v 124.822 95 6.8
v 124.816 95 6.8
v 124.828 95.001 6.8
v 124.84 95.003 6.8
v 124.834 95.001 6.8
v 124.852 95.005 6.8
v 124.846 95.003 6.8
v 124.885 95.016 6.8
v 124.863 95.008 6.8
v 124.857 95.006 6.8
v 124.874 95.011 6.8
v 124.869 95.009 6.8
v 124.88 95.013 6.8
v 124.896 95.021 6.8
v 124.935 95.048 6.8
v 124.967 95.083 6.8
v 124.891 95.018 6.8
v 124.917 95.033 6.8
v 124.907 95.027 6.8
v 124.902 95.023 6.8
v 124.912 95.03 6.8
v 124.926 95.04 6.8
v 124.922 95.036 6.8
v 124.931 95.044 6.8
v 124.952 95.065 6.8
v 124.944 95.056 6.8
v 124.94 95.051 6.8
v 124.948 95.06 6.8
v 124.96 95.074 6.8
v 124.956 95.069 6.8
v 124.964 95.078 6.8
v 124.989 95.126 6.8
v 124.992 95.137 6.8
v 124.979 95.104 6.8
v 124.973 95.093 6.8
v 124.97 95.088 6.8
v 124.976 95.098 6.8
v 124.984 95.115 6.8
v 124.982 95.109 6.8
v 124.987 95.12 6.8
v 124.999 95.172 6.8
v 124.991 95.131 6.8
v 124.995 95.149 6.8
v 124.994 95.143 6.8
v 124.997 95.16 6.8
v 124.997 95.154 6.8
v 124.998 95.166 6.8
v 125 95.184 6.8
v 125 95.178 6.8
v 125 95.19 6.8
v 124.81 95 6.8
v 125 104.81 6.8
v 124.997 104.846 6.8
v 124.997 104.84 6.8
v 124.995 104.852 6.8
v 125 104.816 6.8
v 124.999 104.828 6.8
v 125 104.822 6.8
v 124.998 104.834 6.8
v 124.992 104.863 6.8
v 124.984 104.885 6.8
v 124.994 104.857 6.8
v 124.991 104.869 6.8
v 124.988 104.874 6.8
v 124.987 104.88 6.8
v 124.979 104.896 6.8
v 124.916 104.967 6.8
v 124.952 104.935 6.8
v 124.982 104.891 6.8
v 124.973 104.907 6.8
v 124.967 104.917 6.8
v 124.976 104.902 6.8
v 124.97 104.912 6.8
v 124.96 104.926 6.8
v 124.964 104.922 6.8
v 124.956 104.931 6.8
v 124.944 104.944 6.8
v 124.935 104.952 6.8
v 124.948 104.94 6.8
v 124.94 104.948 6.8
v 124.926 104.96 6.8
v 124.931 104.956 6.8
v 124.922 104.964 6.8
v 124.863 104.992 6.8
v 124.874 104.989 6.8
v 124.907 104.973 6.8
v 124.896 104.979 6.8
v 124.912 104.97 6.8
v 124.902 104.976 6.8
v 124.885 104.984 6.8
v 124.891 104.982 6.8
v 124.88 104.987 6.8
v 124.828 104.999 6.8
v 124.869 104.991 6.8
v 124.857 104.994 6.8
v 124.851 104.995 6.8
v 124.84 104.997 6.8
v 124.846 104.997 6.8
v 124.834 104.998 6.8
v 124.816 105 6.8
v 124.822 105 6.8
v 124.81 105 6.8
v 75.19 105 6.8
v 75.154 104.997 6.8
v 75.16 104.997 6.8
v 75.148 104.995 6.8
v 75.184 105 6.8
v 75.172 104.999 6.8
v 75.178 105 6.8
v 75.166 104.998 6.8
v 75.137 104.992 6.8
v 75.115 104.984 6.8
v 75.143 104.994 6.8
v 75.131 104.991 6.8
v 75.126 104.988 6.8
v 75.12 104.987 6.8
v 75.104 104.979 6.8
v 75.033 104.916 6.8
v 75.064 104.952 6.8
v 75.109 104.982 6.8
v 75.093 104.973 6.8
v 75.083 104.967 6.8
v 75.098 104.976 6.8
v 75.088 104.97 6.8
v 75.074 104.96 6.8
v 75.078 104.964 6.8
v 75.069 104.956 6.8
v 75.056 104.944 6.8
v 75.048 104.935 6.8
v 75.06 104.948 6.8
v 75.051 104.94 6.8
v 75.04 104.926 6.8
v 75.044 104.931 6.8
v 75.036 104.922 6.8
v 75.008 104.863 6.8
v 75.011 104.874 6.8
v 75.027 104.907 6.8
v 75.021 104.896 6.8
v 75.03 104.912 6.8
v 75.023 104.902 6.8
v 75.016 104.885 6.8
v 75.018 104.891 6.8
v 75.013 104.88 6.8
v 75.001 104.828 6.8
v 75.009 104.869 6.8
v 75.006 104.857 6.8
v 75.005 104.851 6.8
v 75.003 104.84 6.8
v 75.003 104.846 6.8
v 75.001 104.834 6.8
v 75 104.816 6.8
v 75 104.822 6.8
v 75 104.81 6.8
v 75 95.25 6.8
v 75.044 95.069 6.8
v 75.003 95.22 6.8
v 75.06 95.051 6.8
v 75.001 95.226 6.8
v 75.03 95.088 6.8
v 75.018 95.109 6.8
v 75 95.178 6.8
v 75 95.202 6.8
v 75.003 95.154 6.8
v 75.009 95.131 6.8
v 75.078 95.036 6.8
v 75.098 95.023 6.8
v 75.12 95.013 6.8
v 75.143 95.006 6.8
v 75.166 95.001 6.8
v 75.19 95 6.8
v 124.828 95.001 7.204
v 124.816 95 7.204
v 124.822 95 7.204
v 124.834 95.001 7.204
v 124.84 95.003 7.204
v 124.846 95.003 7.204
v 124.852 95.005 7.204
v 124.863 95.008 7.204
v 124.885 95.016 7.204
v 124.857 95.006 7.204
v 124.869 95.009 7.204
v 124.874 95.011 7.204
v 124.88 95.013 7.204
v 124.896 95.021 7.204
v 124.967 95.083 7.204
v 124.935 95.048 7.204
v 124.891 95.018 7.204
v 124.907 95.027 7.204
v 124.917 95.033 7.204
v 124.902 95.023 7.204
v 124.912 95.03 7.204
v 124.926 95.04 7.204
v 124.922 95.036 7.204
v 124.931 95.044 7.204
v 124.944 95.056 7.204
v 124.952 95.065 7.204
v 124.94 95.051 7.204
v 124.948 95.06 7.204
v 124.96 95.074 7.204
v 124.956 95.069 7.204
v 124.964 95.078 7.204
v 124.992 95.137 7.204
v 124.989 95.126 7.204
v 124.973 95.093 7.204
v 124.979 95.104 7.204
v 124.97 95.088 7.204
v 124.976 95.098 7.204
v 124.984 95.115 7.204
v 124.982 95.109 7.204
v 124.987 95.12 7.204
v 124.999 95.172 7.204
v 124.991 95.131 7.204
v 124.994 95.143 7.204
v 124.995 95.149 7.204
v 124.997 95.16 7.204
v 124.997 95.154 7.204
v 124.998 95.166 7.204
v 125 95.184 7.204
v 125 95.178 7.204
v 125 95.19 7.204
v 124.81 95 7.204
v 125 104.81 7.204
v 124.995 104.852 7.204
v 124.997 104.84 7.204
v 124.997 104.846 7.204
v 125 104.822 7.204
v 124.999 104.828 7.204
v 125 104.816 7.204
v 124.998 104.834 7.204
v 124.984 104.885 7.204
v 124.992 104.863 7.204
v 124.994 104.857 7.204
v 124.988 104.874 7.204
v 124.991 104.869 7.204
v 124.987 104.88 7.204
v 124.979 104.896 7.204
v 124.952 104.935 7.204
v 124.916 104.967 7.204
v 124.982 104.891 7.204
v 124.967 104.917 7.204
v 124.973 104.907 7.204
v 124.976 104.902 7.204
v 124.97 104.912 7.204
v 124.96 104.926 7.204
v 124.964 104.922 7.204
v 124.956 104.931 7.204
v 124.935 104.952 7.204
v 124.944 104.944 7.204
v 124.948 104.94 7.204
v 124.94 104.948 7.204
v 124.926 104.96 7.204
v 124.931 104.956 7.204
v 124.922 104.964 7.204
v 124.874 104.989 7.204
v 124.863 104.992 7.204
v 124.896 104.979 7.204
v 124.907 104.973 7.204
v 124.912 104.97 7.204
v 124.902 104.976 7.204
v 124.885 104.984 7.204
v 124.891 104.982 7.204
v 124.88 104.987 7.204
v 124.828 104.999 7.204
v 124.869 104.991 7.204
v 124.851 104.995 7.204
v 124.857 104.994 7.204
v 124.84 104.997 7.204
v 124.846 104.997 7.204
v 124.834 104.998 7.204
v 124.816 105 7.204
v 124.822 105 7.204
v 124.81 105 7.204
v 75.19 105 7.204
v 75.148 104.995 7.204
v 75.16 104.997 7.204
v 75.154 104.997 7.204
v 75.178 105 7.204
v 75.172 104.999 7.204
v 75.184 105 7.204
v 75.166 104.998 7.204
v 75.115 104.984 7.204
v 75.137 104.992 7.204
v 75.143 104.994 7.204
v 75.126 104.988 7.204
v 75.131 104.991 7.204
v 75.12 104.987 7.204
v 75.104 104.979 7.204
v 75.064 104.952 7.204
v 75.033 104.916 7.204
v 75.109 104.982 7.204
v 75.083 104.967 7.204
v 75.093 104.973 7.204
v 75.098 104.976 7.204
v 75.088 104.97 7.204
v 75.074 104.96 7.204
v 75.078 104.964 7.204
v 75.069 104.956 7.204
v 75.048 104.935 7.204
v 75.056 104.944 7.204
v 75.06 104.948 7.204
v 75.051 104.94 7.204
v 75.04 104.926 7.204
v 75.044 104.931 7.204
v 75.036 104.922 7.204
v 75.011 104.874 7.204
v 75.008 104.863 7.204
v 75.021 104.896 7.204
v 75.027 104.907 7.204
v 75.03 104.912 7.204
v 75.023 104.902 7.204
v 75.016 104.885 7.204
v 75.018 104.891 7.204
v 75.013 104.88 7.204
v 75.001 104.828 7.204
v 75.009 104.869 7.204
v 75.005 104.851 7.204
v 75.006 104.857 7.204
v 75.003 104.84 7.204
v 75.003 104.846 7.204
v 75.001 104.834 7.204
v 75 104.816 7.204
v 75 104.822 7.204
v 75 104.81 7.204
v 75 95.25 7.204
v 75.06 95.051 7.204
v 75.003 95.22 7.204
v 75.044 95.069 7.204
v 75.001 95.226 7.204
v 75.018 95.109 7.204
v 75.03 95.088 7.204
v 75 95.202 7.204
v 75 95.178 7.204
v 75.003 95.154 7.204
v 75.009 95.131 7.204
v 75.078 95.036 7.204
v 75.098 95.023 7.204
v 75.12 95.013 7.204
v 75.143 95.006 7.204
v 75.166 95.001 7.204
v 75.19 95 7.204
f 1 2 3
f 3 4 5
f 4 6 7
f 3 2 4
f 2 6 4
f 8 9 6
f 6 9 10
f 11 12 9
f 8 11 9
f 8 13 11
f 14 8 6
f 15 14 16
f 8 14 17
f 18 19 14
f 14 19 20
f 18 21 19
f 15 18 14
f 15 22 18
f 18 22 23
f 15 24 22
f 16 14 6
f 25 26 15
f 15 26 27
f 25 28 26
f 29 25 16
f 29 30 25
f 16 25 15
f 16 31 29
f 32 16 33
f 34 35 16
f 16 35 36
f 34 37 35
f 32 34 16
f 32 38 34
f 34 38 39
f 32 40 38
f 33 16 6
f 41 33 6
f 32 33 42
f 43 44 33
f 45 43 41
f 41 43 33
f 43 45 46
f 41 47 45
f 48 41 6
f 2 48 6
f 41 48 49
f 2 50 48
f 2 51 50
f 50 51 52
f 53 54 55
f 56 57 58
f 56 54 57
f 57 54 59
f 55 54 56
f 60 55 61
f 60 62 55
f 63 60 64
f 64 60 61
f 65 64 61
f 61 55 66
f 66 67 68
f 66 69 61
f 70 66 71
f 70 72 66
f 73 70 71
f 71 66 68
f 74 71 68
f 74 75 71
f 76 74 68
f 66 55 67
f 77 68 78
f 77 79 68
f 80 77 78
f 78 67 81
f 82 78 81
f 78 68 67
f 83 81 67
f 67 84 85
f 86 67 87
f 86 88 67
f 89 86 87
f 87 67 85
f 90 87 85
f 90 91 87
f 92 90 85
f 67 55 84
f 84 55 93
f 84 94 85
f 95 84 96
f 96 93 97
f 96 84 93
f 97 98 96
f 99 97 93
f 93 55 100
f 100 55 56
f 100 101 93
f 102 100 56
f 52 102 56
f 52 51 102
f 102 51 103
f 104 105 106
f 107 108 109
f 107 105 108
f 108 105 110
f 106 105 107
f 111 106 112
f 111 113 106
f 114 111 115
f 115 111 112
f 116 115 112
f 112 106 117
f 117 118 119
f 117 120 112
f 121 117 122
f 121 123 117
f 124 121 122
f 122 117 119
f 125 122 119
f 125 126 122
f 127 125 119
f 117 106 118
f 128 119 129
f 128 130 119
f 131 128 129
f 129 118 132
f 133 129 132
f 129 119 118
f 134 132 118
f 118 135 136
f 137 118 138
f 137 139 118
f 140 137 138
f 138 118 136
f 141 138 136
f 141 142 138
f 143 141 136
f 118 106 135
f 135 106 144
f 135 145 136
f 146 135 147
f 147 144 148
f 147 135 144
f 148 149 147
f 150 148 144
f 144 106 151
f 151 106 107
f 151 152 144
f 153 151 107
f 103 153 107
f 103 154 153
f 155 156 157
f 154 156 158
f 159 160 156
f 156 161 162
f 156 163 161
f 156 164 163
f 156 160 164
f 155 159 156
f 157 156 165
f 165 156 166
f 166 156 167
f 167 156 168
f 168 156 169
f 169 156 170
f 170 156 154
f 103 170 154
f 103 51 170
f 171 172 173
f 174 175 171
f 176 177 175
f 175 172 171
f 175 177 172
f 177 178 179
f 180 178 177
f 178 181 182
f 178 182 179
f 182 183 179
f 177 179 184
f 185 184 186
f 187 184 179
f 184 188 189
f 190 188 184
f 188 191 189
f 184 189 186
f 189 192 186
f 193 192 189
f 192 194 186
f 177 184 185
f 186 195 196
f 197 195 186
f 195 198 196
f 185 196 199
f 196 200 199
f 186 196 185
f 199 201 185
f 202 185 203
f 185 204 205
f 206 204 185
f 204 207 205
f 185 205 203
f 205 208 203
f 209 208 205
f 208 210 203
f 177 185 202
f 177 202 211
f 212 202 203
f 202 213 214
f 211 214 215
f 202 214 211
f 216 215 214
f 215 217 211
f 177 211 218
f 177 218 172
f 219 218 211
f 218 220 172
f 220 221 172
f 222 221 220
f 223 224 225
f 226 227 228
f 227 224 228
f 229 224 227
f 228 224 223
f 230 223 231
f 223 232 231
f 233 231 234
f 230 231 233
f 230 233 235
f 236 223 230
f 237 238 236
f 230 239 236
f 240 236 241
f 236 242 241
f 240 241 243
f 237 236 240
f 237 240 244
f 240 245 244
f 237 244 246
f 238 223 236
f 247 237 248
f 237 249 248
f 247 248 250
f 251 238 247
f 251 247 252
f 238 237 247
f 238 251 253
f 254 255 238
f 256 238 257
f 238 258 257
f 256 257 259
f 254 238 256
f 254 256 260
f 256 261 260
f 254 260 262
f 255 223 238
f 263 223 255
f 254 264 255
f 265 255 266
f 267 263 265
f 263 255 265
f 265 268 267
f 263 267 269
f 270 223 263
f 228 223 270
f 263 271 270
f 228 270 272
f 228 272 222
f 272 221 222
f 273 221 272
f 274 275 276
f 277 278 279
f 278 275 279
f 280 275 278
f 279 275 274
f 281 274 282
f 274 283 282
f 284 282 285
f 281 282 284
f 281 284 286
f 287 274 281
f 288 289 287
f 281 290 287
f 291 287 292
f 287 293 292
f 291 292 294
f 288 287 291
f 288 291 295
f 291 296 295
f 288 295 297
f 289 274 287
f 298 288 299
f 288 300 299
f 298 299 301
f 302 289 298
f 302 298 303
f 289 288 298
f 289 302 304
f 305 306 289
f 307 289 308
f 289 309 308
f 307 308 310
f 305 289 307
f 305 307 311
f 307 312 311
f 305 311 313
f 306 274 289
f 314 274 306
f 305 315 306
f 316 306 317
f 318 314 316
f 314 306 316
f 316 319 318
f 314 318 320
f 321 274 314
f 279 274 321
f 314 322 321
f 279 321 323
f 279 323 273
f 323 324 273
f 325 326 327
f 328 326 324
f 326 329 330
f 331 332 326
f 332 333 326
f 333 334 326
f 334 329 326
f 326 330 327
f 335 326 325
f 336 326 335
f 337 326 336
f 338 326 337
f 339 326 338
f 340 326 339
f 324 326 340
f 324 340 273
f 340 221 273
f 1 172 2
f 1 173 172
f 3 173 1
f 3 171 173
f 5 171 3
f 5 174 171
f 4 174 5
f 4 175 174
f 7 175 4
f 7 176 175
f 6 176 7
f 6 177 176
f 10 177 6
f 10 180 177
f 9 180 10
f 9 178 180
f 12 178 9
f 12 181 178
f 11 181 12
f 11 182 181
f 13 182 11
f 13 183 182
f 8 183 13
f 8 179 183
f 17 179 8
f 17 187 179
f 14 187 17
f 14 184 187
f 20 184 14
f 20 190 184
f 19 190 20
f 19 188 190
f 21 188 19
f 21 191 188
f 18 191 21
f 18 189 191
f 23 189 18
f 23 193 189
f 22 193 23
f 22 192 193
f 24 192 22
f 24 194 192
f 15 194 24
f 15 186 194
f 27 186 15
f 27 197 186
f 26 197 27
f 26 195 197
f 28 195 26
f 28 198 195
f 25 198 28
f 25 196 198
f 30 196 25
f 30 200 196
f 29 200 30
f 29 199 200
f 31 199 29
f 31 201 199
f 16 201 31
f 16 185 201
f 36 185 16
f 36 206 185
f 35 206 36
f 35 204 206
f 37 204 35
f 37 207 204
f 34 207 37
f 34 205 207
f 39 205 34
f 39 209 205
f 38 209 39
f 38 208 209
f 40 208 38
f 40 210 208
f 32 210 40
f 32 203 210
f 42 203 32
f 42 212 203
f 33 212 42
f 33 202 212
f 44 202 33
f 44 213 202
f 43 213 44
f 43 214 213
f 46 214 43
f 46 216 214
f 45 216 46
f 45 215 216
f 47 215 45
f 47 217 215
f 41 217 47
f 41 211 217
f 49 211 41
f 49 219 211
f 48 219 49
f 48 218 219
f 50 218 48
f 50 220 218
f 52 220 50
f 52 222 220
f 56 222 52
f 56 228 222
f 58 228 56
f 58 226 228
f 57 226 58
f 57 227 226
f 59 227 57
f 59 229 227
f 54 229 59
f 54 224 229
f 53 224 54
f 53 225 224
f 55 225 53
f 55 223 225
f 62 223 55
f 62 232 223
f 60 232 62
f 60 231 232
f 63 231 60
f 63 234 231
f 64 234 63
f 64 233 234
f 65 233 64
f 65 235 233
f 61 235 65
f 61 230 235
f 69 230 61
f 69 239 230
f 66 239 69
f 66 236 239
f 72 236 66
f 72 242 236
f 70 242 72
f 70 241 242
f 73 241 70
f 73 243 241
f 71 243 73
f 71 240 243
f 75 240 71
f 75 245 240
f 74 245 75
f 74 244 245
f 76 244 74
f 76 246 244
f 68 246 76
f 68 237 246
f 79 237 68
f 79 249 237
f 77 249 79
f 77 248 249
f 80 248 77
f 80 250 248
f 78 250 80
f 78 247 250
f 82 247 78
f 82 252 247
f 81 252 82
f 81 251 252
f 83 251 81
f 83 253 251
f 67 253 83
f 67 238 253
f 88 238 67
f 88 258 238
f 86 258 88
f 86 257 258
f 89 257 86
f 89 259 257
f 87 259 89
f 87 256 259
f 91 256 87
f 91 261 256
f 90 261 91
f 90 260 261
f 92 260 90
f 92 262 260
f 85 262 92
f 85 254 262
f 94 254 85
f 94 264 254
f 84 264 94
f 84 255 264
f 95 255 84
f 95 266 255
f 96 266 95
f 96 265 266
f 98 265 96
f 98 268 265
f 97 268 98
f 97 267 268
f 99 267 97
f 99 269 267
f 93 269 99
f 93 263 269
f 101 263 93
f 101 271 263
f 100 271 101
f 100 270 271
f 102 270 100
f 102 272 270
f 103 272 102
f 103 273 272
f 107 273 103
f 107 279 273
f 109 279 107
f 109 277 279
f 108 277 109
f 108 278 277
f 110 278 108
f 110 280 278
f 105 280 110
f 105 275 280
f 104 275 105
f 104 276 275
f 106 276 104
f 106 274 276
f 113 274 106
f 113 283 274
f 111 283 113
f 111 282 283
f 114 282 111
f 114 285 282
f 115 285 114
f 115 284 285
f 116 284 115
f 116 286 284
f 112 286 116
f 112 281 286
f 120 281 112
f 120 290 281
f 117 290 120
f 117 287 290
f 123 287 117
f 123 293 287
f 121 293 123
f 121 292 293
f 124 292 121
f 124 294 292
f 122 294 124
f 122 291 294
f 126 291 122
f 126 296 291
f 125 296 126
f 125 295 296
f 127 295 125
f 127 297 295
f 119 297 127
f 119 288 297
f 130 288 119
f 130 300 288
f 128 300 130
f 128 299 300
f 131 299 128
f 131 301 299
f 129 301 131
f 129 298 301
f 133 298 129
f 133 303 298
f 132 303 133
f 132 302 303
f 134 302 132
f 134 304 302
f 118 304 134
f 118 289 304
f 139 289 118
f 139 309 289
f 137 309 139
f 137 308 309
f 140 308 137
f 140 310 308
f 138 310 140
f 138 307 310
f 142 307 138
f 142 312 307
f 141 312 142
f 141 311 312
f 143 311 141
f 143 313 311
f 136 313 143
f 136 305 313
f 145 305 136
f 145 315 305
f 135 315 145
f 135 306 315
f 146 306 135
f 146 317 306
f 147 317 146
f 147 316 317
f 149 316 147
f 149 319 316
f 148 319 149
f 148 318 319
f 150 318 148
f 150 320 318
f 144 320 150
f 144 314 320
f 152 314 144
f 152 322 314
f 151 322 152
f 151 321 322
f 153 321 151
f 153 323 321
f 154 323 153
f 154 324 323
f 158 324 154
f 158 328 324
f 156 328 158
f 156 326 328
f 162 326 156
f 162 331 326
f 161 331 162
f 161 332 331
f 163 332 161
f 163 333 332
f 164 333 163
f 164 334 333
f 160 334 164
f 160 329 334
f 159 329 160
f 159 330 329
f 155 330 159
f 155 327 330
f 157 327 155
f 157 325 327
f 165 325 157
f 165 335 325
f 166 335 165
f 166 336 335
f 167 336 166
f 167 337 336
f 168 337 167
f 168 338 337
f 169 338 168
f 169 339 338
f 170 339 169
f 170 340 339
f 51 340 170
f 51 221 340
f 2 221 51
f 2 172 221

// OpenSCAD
module drawBasicShape(x1, y1, x2, y2, width)
{
	length = sqrt((x1-x2)*(x1-x2) + (y1-y2)*(y1-y2));
	if (width!=0.0) {
		square(size = [width, length], center = false);
		translate([width/2.0, 0, 0]) circle(d=width);
		translate([width/2.0, length, 0]) circle(d=width);
	}
}

module translateAndRotate(x1, y1, x2, y2, width)
{
	if (width != 0.0) {
		angle = atan((y2-y1)/(x2-x1)) +270;
		if (x2>=x1) {
			translate([x1, y1, 0.0]) rotate([0.0, 0.0, angle]) translate([-width/2.0, 0.0, 0.0]) scale([1.0, 1.0, 1.0]) drawBasicShape(x1, y1, x2, y2, width);
		}
		else {
			translate([x1, y1, 0.0]) rotate([0.0, 0.0, angle+180]) translate([-width/2.0, 0.0, 0.0]) scale([1.0, 1.0, 1.0]) drawBasicShape(x1, y1, x2, y2, width);		}
	}
}

$fn=50;

points16 = [
[75.77800000, 95.77800000, 0.00000000],
[124.22200000, 95.77800000, 0.37999548],
[124.22200000, 104.22200000, 0.37997788],
[75.77800000, 104.22200000, 0.37999672],
[75.77800000, 95.83800000, 0.37997423],
[75.48400000, 95.48400000, 0.00000000],
[124.51600000, 95.48400000, 0.37999868],
[124.51600000, 104.51600000, 0.37998977],
[75.48400000, 104.51600000, 0.37999746],
[75.48400000, 95.54400000, 0.37999314],
[75.19000000, 95.19000000, 0.00000000],
[124.81000000, 95.19000000, 0.37999939],
[124.81000000, 104.81000000, 0.38000021],
[75.19000000, 104.81000000, 0.38000060],
[75.19000000, 95.25000000, 0.37999715],
[75.53600000, 95.39000000, 0.00000000],
[75.94600000, 103.88900000, 0.00000000],
[76.11100000, 104.05400000, 0.37961375],
[76.52800000, 104.05400000, 0.38001190],
[75.94600000, 103.47200000, 0.37989934],
[75.94600000, 103.05500000, 0.38001190],
[76.94500000, 104.05400000, 0.37998907],
[77.36200000, 104.05400000, 0.38001190],
[75.94600000, 102.63800000, 0.37999592],
[75.94600000, 102.22100000, 0.38001190],
[77.77900000, 104.05400000, 0.37999966],
[78.19600000, 104.05400000, 0.38001190],
[75.94600000, 101.80400000, 0.38002091],
[75.94600000, 101.38700000, 0.38001190],
[78.61300000, 104.05400000, 0.38001957],
[79.03000000, 104.05400000, 0.38001190],
[75.94600000, 100.97000000, 0.38001859],
[75.94600000, 100.55300000, 0.38001190],
[79.44700000, 104.05400000, 0.38002999],
[79.86400000, 104.05400000, 0.38001190],
[75.94600000, 100.13600000, 0.38002811],
[75.94600000, 99.71900000, 0.38001190],
[80.28100000, 104.05400000, 0.38002660],
[80.69800000, 104.05400000, 0.38001190],
[75.94600000, 99.30200000, 0.38003429],
[75.94600000, 98.88500000, 0.38001190],
[81.11500000, 104.05400000, 0.38003252],
[81.53300000, 104.05400000, 0.37930814],
[75.94600000, 98.46700000, 0.37997836],
[75.94600000, 98.05000000, 0.38001190],
[81.95000000, 104.05400000, 0.37998072],
[82.36700000, 104.05400000, 0.38015610],
[75.94600000, 97.63300000, 0.37998277],
[75.94600000, 97.21600000, 0.38015610],
[82.78400000, 104.05400000, 0.37999079],
[83.20100000, 104.05400000, 0.38001190],
[75.94600000, 96.79900000, 0.37999203],
[75.94600000, 96.38200000, 0.38001190],
[83.61800000, 104.05400000, 0.37999868],
[84.03500000, 104.05400000, 0.38001190],
[75.95600000, 95.97600000, 0.38000275],
[76.34400000, 95.94600000, 0.37958004],
[84.45200000, 104.05400000, 0.38000754],
[84.86900000, 104.05400000, 0.38001190],
[76.76100000, 95.94600000, 0.38000229],
[77.17800000, 95.94600000, 0.38001190],
[85.28600000, 104.05400000, 0.38000754],
[85.70300000, 104.05400000, 0.38001190],
[77.59500000, 95.94600000, 0.38000229],
[78.01200000, 95.94600000, 0.38015610],
[86.12000000, 104.05400000, 0.38000229],
[86.53700000, 104.05400000, 0.38001190],
[78.42900000, 95.94600000, 0.38000229],
[78.84600000, 95.94600000, 0.38015610],
[86.95400000, 104.05400000, 0.38000229],
[87.37100000, 104.05400000, 0.38001190],
[79.26300000, 95.94600000, 0.38000754],
[79.68000000, 95.94600000, 0.38001190],
[87.78900000, 104.05400000, 0.37998415],
[88.20600000, 104.05400000, 0.38015610],
[80.09700000, 95.94600000, 0.37998415],
[80.51500000, 95.94600000, 0.37930814],
[88.62300000, 104.05400000, 0.38000229],
[89.04000000, 104.05400000, 0.38015610],
[80.93200000, 95.94600000, 0.38000229],
[81.34900000, 95.94600000, 0.38001190],
[89.45700000, 104.05400000, 0.38000754],
[89.87400000, 104.05400000, 0.38001190],
[81.76600000, 95.94600000, 0.38000229],
[82.18300000, 95.94600000, 0.38001190],
[90.29100000, 104.05400000, 0.38000754],
[90.70800000, 104.05400000, 0.38001190],
[82.60000000, 95.94600000, 0.38000229],
[83.01700000, 95.94600000, 0.38015610],
[91.12500000, 104.05400000, 0.38000229],
[91.54200000, 104.05400000, 0.38001190],
[83.43400000, 95.94600000, 0.38000754],
[83.85100000, 95.94600000, 0.38001190],
[91.95900000, 104.05400000, 0.38000229],
[92.37600000, 104.05400000, 0.38001190],
[84.26800000, 95.94600000, 0.38000754],
[84.68500000, 95.94600000, 0.38001190],
[92.79300000, 104.05400000, 0.38000229],
[93.21000000, 104.05400000, 0.38015610],
[85.10200000, 95.94600000, 0.38000229],
[85.51900000, 95.94600000, 0.38001190],
[93.62700000, 104.05400000, 0.38000754],
[94.04400000, 104.05400000, 0.38001190],
[85.93600000, 95.94600000, 0.38000229],
[86.35300000, 95.94600000, 0.38001190],
[94.46200000, 104.05400000, 0.37998940],
[94.87900000, 104.05400000, 0.38001190],
[86.77000000, 95.94600000, 0.37998415],
[87.18800000, 95.94600000, 0.37945200],
[95.29600000, 104.05400000, 0.38000229],
[95.71300000, 104.05400000, 0.38001190],
[87.60500000, 95.94600000, 0.38000754],
[88.02200000, 95.94600000, 0.38001190],
[96.13000000, 104.05400000, 0.38000229],
[96.54700000, 104.05400000, 0.38001190],
[88.43900000, 95.94600000, 0.38000754],
[88.85600000, 95.94600000, 0.38001190],
[96.96400000, 104.05400000, 0.38000229],
[97.38100000, 104.05400000, 0.38015610],
[89.27300000, 95.94600000, 0.38000229],
[89.69000000, 95.94600000, 0.38001190],
[97.79800000, 104.05400000, 0.38000754],
[98.21500000, 104.05400000, 0.38001190],
[90.10700000, 95.94600000, 0.38000229],
[90.52400000, 95.94600000, 0.38001190],
[98.63200000, 104.05400000, 0.38000754],
[99.04900000, 104.05400000, 0.38001190],
[90.94100000, 95.94600000, 0.38000229],
[91.35800000, 95.94600000, 0.38015610],
[99.46600000, 104.05400000, 0.38000229],
[99.88300000, 104.05400000, 0.38001190],
[91.77500000, 95.94600000, 0.38000754],
[92.19200000, 95.94600000, 0.38001190],
[100.30000000, 104.05400000, 0.38000229],
[100.71800000, 104.05400000, 0.37930814],
[92.60900000, 95.94600000, 0.37998940],
[93.02600000, 95.94600000, 0.38001190],
[101.13500000, 104.05400000, 0.37998415],
[101.55200000, 104.05400000, 0.38015610],
[93.44400000, 95.94600000, 0.38000229],
[93.86100000, 95.94600000, 0.38001190],
[101.96900000, 104.05400000, 0.38000754],
[102.38600000, 104.05400000, 0.38001190],
[94.27800000, 95.94600000, 0.38000229],
[94.69500000, 95.94600000, 0.38001190],
[102.80300000, 104.05400000, 0.38000754],
[103.22000000, 104.05400000, 0.38001190],
[95.11200000, 95.94600000, 0.38000229],
[95.52900000, 95.94600000, 0.38015610],
[103.63700000, 104.05400000, 0.38000229],
[104.05400000, 104.05400000, 0.38001190],
[95.94600000, 95.94600000, 0.38000229],
[96.36300000, 95.94600000, 0.38015610],
[104.47100000, 104.05400000, 0.38000229],
[104.88800000, 104.05400000, 0.38001190],
[96.78000000, 95.94600000, 0.38000754],
[97.19700000, 95.94600000, 0.38001190],
[105.30500000, 104.05400000, 0.38000229],
[105.72200000, 104.05400000, 0.38001190],
[97.61400000, 95.94600000, 0.38000754],
[98.03100000, 95.94600000, 0.38001190],
[106.13900000, 104.05400000, 0.38000229],
[106.55600000, 104.05400000, 0.38015610],
[98.44800000, 95.94600000, 0.38000229],
[98.86500000, 95.94600000, 0.38001190],
[106.97300000, 104.05400000, 0.38000754],
[107.39100000, 104.05400000, 0.37930814],
[99.28200000, 95.94600000, 0.37998415],
[99.69900000, 95.94600000, 0.38001190],
[107.80800000, 104.05400000, 0.37998940],
[108.22500000, 104.05400000, 0.38001190],
[100.11700000, 95.94600000, 0.38000229],
[100.53400000, 95.94600000, 0.38015610],
[108.64200000, 104.05400000, 0.38000229],
[109.05900000, 104.05400000, 0.38001190],
[100.95100000, 95.94600000, 0.38000754],
[101.36800000, 95.94600000, 0.38001190],
[109.47600000, 104.05400000, 0.38000229],
[109.89300000, 104.05400000, 0.38001190],
[101.78500000, 95.94600000, 0.38000754],
[102.20200000, 95.94600000, 0.38001190],
[110.31000000, 104.05400000, 0.38000229],
[110.72700000, 104.05400000, 0.38015610],
[102.61900000, 95.94600000, 0.38000229],
[103.03600000, 95.94600000, 0.38001190],
[111.14400000, 104.05400000, 0.38000754],
[111.56100000, 104.05400000, 0.38001190],
[103.45300000, 95.94600000, 0.38000229],
[103.87000000, 95.94600000, 0.38001190],
[111.97800000, 104.05400000, 0.38000754],
[112.39500000, 104.05400000, 0.38001190],
[104.28700000, 95.94600000, 0.38000229],
[104.70400000, 95.94600000, 0.38015610],
[112.81200000, 104.05400000, 0.38000229],
[113.22900000, 104.05400000, 0.38001190],
[105.12100000, 95.94600000, 0.38000754],
[105.53800000, 95.94600000, 0.38001190],
[113.64700000, 104.05400000, 0.37998415],
[114.06400000, 104.05400000, 0.38001190],
[105.95500000, 95.94600000, 0.37998940],
[106.37300000, 95.94600000, 0.37930814],
[114.48100000, 104.05400000, 0.38000229],
[114.89800000, 104.05400000, 0.38015610],
[106.79000000, 95.94600000, 0.38000229],
[107.20700000, 95.94600000, 0.38001190],
[115.31500000, 104.05400000, 0.38000754],
[115.73200000, 104.05400000, 0.38001190],
[107.62400000, 95.94600000, 0.38000229],
[108.04100000, 95.94600000, 0.38001190],
[116.14900000, 104.05400000, 0.38000754],
[116.56600000, 104.05400000, 0.38001190],
[108.45800000, 95.94600000, 0.38000229],
[108.87500000, 95.94600000, 0.38015610],
[116.98300000, 104.05400000, 0.38000229],
[117.40000000, 104.05400000, 0.38001190],
[109.29200000, 95.94600000, 0.38000229],
[109.70900000, 95.94600000, 0.38015610],
[117.81700000, 104.05400000, 0.38000229],
[118.23400000, 104.05400000, 0.38001190],
[110.12600000, 95.94600000, 0.38000754],
[110.54300000, 95.94600000, 0.38001190],
[118.65100000, 104.05400000, 0.38000229],
[119.06800000, 104.05400000, 0.38001190],
[110.96000000, 95.94600000, 0.38000754],
[111.37700000, 95.94600000, 0.38001190],
[119.48500000, 104.05400000, 0.38000229],
[119.90200000, 104.05400000, 0.38015610],
[111.79400000, 95.94600000, 0.38000229],
[112.21100000, 95.94600000, 0.38001190],
[120.32000000, 104.05400000, 0.37998940],
[120.73700000, 104.05400000, 0.38001190],
[112.62900000, 95.94600000, 0.38000229],
[113.04600000, 95.94600000, 0.38001190],
[121.15400000, 104.05400000, 0.38000754],
[121.57100000, 104.05400000, 0.38001190],
[113.46300000, 95.94600000, 0.38000229],
[113.88000000, 95.94600000, 0.38015610],
[121.98800000, 104.05400000, 0.38000229],
[122.40500000, 104.05400000, 0.38001190],
[114.29700000, 95.94600000, 0.38000754],
[114.71400000, 95.94600000, 0.38001190],
[122.82200000, 104.05400000, 0.38000229],
[123.23900000, 104.05400000, 0.38001190],
[115.13100000, 95.94600000, 0.38000754],
[115.54800000, 95.94600000, 0.38001190],
[123.65600000, 104.05400000, 0.38000229],
[124.04400000, 104.02500000, 0.37979183],
[115.96500000, 95.94600000, 0.37998455],
[116.38200000, 95.94600000, 0.38001190],
[124.05400000, 103.61800000, 0.37999868],
[124.05400000, 103.20100000, 0.38001190],
[116.79900000, 95.94600000, 0.37999789],
[117.21600000, 95.94600000, 0.38001190],
[124.05400000, 102.78400000, 0.37999079],
[124.05400000, 102.36700000, 0.38015610],
[117.63300000, 95.94600000, 0.37998939],
[118.05000000, 95.94600000, 0.38001190],
[124.05400000, 101.95000000, 0.37998072],
[124.05400000, 101.53300000, 0.38015610],
[118.46700000, 95.94600000, 0.37997836],
[118.88400000, 95.94600000, 0.38001190],
[124.05400000, 101.11600000, 0.37997562],
[124.05400000, 100.69800000, 0.37945200],
[119.30200000, 95.94600000, 0.38002534],
[119.71900000, 95.94600000, 0.38015610],
[124.05400000, 100.28100000, 0.38002660],
[124.05400000, 99.86400000, 0.38001190],
[120.13600000, 95.94600000, 0.38002811],
[120.55300000, 95.94600000, 0.38015610],
[124.05400000, 99.44700000, 0.38001785],
[124.05400000, 99.03000000, 0.38015610],
[120.97000000, 95.94600000, 0.38001859],
[121.38700000, 95.94600000, 0.38001190],
[124.05400000, 98.61300000, 0.38001957],
[124.05400000, 98.19600000, 0.38001190],
[121.80400000, 95.94600000, 0.38002091],
[122.22100000, 95.94600000, 0.38001190],
[124.05400000, 97.77900000, 0.38002285],
[124.05400000, 97.36200000, 0.38001190],
[122.63800000, 95.94600000, 0.37999592],
[123.05500000, 95.94600000, 0.38001190],
[124.05400000, 96.94500000, 0.37998907],
[124.05400000, 96.52800000, 0.38015610],
[123.47200000, 95.94600000, 0.37989934],
[123.88900000, 95.94600000, 0.38001190],
[124.05400000, 96.11100000, 0.37961375],
];

translate([0.0, 0.0, 6.80000000]) {
	linear_extrude(height = 0.40400000, center = false, convexity = 10, twist = 0) {
		union() {
			for( i=[0:len(points16)-2] ){ 
				x1 = points16[i][0];
				y1 = points16[i][1];
				x2 = points16[i+1][0];
				y2 = points16[i+1][1];
				width = points16[i+1][2];
				translateAndRotate(x1, y1, x2, y2, width);
			}
		}
	}
}
